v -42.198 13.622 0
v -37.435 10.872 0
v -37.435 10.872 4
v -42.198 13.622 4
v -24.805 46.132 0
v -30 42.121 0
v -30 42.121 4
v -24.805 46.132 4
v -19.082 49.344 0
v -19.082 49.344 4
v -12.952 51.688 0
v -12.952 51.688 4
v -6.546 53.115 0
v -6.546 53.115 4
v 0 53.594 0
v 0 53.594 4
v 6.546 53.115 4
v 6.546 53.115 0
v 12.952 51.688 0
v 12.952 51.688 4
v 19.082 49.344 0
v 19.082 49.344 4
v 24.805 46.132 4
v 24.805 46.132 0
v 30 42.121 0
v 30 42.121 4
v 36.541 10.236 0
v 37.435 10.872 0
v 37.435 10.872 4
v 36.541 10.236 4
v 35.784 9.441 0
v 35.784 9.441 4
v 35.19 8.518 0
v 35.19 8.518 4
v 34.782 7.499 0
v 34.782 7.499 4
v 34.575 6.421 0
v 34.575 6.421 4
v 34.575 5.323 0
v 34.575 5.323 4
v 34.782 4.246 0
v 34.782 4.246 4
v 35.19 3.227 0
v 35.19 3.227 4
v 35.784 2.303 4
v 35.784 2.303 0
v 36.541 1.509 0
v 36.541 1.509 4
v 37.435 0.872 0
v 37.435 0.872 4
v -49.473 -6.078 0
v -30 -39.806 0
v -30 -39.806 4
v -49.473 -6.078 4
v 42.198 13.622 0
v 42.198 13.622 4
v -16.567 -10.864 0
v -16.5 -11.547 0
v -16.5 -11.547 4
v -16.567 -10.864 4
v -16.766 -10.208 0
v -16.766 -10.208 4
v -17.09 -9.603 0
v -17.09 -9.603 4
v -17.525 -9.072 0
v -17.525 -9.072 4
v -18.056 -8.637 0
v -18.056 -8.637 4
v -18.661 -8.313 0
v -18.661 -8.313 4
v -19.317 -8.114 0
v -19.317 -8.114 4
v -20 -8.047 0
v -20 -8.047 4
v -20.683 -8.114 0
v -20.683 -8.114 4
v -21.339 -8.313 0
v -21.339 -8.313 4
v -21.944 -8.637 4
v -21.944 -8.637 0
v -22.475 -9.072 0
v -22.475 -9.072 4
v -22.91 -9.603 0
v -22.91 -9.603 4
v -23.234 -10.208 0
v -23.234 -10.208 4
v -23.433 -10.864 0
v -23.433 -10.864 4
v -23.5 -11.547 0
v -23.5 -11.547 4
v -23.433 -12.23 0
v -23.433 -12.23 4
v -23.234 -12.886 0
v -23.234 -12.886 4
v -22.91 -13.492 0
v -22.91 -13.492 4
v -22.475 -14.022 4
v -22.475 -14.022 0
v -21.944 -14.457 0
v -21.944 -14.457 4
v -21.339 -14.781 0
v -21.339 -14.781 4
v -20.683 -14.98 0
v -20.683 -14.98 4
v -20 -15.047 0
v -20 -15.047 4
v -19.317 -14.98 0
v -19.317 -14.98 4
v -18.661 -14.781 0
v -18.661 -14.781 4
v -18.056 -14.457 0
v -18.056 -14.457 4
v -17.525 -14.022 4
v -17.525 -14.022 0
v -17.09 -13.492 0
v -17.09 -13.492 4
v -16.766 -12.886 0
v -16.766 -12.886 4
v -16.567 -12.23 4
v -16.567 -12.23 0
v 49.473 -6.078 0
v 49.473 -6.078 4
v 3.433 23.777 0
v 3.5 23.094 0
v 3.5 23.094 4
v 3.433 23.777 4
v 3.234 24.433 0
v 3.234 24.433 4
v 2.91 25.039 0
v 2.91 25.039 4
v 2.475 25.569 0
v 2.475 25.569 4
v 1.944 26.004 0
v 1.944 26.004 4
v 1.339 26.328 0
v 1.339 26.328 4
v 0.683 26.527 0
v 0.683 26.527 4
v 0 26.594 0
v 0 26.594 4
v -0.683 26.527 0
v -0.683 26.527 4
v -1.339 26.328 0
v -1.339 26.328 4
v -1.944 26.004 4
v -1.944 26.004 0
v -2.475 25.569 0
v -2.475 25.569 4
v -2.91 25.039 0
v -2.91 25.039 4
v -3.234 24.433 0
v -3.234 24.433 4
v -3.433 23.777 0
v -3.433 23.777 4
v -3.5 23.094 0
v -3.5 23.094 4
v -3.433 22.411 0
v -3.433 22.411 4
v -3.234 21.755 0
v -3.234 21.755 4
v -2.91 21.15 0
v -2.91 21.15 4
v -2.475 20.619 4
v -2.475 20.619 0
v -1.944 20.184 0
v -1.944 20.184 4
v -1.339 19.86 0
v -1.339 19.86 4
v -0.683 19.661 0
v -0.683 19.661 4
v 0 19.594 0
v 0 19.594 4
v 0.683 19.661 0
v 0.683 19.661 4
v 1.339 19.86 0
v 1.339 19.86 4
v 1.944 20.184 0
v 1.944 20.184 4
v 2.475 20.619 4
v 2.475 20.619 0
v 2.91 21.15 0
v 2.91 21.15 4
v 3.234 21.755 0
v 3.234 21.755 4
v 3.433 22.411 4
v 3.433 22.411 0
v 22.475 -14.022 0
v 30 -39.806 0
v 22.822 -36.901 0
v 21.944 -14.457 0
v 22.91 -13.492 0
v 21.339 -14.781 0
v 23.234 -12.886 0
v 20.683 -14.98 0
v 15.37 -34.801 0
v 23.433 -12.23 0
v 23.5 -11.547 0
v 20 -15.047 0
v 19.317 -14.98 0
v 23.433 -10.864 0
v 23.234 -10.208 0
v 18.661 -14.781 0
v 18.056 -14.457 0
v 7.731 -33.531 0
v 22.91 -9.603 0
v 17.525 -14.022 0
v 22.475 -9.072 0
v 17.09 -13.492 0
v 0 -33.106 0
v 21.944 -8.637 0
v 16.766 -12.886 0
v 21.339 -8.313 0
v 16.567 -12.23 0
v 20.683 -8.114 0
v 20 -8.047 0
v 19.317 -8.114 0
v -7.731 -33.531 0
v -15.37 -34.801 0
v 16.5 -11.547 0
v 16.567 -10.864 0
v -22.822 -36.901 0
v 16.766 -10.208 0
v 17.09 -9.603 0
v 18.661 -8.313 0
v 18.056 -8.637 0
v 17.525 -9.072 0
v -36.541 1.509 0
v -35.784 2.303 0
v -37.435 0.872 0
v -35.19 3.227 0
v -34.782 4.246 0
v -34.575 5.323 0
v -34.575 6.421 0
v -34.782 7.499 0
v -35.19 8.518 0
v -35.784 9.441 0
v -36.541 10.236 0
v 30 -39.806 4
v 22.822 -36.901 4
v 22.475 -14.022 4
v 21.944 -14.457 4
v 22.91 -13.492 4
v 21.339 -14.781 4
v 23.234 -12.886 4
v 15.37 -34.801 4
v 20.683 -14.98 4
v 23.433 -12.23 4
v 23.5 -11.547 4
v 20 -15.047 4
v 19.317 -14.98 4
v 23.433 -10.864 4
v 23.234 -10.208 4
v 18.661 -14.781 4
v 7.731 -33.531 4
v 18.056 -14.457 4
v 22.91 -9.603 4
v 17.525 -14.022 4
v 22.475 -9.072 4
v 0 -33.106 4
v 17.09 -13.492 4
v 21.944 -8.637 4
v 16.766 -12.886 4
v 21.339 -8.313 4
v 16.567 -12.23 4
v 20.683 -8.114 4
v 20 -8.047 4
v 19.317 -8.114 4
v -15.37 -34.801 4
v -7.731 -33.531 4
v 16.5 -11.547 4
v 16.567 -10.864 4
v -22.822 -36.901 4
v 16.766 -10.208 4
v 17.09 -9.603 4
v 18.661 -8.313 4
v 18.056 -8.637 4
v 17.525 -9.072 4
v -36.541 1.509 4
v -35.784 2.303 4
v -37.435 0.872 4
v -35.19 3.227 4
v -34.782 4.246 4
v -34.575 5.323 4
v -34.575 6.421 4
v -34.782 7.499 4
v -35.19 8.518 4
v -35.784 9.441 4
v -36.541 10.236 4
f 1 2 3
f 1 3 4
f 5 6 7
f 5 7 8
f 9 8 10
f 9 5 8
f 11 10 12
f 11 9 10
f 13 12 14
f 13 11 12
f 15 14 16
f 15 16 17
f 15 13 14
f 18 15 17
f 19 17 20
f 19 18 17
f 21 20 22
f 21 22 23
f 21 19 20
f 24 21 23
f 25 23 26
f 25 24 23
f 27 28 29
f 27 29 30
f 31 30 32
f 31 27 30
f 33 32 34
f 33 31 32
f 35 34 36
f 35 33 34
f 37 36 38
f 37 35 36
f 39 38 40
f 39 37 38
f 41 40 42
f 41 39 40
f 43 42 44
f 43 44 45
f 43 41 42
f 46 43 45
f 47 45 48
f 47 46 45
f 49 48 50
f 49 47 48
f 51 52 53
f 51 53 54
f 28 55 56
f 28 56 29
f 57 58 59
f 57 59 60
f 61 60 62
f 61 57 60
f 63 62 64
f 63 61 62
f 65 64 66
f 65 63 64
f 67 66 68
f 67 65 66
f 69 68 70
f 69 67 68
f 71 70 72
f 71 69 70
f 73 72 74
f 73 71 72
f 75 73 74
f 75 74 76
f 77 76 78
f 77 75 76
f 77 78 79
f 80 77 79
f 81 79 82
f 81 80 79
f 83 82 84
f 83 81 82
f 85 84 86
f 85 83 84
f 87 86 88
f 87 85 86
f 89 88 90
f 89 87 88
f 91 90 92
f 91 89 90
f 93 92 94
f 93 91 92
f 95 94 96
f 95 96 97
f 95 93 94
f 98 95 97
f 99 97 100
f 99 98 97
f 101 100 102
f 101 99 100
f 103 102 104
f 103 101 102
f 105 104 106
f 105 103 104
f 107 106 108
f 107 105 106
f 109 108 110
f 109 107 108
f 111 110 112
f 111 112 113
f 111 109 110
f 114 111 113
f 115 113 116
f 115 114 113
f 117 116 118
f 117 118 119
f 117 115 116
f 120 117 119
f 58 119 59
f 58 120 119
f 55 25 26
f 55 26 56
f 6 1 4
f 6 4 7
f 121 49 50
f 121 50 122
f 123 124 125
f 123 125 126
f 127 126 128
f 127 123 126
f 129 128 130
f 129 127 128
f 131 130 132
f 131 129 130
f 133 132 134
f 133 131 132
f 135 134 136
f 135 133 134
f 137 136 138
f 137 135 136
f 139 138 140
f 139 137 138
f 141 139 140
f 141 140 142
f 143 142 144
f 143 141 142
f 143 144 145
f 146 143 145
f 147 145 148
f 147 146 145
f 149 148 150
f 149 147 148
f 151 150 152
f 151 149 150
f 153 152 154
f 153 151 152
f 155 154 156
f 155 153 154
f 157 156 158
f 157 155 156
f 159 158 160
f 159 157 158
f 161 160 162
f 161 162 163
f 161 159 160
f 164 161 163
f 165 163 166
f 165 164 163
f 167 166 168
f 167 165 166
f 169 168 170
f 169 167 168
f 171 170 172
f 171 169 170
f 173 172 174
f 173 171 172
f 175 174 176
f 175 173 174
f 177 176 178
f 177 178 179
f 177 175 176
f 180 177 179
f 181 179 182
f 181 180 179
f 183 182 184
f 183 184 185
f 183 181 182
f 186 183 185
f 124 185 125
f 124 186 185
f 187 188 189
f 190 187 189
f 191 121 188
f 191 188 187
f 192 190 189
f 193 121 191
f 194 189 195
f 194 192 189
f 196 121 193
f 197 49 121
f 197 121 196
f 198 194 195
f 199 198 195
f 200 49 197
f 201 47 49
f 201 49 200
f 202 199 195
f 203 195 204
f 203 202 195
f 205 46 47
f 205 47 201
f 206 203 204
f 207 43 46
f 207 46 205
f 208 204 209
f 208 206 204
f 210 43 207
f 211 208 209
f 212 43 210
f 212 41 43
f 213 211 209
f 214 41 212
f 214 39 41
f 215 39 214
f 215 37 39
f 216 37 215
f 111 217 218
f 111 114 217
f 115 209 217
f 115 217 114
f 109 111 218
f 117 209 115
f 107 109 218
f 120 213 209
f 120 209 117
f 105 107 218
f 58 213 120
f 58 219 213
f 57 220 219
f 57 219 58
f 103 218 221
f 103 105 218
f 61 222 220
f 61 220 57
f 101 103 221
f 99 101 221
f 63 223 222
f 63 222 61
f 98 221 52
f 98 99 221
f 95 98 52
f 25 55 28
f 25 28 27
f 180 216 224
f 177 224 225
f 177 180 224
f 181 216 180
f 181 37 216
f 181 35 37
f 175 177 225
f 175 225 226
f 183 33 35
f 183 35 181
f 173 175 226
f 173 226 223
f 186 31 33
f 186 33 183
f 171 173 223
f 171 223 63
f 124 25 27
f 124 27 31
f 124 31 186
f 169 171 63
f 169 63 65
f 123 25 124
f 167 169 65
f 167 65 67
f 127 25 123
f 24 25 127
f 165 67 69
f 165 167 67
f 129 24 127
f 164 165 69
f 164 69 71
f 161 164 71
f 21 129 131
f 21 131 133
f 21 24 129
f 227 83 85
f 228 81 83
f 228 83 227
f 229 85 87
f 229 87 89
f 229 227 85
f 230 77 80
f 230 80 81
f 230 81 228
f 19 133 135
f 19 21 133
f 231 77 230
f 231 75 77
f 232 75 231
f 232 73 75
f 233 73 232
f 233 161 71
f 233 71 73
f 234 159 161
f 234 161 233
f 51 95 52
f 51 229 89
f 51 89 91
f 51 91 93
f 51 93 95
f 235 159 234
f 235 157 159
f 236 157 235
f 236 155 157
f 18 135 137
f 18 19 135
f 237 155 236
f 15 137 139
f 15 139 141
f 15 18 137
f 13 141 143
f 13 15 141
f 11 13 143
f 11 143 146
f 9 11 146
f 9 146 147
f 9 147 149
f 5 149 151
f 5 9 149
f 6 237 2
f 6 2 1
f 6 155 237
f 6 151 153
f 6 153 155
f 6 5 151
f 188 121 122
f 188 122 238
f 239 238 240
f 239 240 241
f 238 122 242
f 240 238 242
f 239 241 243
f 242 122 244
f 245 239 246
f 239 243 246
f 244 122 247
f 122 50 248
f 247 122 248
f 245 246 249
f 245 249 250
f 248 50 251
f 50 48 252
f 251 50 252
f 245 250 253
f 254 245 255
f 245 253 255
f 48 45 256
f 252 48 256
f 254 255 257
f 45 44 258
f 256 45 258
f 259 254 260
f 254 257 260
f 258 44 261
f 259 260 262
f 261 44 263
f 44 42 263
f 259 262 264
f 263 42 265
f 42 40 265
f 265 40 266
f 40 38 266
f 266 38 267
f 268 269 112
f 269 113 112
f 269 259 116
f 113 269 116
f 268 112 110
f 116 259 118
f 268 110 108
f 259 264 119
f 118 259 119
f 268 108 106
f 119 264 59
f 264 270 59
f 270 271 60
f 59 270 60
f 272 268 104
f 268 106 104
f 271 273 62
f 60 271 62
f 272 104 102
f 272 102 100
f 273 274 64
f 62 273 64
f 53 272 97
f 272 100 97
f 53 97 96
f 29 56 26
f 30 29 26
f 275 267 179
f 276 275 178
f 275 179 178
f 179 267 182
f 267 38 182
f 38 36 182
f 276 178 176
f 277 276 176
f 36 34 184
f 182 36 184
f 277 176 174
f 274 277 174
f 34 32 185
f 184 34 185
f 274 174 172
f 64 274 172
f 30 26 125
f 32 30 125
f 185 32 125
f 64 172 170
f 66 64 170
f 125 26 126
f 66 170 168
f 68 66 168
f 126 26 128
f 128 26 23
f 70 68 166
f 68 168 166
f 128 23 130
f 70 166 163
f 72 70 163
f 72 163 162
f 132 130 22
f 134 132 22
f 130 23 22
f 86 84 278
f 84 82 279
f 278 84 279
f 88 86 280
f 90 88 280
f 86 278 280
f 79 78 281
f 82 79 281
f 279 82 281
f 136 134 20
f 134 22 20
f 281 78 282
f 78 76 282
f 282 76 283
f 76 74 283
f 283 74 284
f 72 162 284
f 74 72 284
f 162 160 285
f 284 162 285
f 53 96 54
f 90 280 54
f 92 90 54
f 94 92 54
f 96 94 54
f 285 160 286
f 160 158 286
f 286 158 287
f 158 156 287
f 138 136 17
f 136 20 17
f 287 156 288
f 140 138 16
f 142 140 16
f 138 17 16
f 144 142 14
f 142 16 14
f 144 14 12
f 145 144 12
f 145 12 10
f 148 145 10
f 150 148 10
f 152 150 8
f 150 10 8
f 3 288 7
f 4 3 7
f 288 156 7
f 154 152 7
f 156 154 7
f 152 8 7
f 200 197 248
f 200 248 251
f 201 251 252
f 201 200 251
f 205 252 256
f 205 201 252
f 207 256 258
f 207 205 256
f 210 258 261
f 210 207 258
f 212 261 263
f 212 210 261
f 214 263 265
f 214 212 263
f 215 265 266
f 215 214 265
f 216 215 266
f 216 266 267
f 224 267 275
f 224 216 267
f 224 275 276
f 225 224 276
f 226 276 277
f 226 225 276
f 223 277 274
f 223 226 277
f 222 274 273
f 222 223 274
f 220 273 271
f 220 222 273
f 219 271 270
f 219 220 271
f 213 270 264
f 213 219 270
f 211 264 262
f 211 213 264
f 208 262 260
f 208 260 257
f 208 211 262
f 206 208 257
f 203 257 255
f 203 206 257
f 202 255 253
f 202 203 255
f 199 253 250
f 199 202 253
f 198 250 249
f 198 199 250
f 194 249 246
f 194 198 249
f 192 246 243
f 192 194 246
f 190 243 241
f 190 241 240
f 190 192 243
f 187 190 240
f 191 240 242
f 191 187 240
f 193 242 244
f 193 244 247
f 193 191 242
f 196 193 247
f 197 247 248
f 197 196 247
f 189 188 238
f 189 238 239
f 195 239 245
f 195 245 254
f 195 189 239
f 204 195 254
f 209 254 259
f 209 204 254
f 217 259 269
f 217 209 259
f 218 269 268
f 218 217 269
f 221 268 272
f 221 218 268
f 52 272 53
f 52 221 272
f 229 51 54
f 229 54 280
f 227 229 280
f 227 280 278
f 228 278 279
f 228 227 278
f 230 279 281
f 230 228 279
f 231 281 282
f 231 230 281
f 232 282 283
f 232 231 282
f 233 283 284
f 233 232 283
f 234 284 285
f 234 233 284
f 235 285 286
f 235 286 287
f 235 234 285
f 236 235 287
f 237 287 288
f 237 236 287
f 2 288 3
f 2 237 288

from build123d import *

# Parameters (mm, degrees)
SKETCH1_R           = 3.5
BOSS_EXTRUDE1_DEPTH = 4


with BuildPart() as part:
    # Sketch1 → Boss-Extrude1 (new body)
    with BuildSketch(Plane.XY):
        with BuildLine():
            Line((-30, -39.805989232), (-49.472997898, -6.077767497))
            Line((-49.472997898, -6.077767497), (-37.435244785, 0.872232503))
            ThreePointArc((-37.435244785, 0.872232503), (-34.548493439, 5.872232503), (-37.435244785, 10.872232503))
            Line((-37.435244785, 10.872232503), (-42.198384506, 13.622232503))
            Line((-42.198384506, 13.622232503), (-30, 42.12134504))
            ThreePointArc((-30, 42.12134504), (0, 53.594010768), (30, 42.12134504))
            Line((30, 42.12134504), (42.198384506, 13.622232503))
            Line((42.198384506, 13.622232503), (37.435244785, 10.872232503))
            ThreePointArc((37.435244785, 10.872232503), (34.548493439, 5.872232503), (37.435244785, 0.872232503))
            Line((37.435244785, 0.872232503), (49.472997898, -6.077767497))
            Line((49.472997898, -6.077767497), (30, -39.805989232))
            ThreePointArc((30, -39.805989232), (0, -33.105989232), (-30, -39.805989232))
        make_face()
        with Locations((0, 23.094010768)):
            Circle(SKETCH1_R, mode=Mode.SUBTRACT)
        with Locations((-20, -11.547005384)):
            Circle(SKETCH1_R, mode=Mode.SUBTRACT)
        with Locations((20, -11.547005384)):
            Circle(SKETCH1_R, mode=Mode.SUBTRACT)
    extrude(amount=BOSS_EXTRUDE1_DEPTH)


solid = part.part
